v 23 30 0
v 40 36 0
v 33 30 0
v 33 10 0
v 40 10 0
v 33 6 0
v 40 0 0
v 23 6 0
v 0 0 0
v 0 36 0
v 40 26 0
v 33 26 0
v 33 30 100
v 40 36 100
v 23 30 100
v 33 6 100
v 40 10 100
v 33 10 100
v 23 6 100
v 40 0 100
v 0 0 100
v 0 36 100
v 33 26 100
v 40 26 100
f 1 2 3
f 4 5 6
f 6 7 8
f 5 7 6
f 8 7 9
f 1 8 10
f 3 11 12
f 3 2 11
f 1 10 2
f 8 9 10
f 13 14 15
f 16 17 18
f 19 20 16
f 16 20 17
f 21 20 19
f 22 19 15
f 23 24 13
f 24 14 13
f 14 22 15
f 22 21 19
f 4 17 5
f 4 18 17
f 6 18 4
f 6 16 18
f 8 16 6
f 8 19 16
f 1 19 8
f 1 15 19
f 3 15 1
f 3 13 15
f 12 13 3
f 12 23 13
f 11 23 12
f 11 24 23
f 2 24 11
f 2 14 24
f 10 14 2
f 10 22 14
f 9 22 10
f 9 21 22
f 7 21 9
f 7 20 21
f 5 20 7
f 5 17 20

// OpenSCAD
$fn = 32;

// ----------------------------------------------------------------------
// T-slot rail: 40 x 36 mm section, 100 mm long
// ----------------------------------------------------------------------

// --- parameters (mm) ---
profile_height = 100;     // extrusion height
profile_points = 12;      // points of the closed outline

profile = [[0, 0], [40, 0], [40, 10], [33, 10], [33, 6], [23, 6], [23, 30], [33, 30], [33, 26], [40, 26], [40, 36], [0, 36]];  // single closed polygon, 12 points, counter clockwise

// --- the one profile operation ---
linear_extrude(height = profile_height) polygon(points = profile);
